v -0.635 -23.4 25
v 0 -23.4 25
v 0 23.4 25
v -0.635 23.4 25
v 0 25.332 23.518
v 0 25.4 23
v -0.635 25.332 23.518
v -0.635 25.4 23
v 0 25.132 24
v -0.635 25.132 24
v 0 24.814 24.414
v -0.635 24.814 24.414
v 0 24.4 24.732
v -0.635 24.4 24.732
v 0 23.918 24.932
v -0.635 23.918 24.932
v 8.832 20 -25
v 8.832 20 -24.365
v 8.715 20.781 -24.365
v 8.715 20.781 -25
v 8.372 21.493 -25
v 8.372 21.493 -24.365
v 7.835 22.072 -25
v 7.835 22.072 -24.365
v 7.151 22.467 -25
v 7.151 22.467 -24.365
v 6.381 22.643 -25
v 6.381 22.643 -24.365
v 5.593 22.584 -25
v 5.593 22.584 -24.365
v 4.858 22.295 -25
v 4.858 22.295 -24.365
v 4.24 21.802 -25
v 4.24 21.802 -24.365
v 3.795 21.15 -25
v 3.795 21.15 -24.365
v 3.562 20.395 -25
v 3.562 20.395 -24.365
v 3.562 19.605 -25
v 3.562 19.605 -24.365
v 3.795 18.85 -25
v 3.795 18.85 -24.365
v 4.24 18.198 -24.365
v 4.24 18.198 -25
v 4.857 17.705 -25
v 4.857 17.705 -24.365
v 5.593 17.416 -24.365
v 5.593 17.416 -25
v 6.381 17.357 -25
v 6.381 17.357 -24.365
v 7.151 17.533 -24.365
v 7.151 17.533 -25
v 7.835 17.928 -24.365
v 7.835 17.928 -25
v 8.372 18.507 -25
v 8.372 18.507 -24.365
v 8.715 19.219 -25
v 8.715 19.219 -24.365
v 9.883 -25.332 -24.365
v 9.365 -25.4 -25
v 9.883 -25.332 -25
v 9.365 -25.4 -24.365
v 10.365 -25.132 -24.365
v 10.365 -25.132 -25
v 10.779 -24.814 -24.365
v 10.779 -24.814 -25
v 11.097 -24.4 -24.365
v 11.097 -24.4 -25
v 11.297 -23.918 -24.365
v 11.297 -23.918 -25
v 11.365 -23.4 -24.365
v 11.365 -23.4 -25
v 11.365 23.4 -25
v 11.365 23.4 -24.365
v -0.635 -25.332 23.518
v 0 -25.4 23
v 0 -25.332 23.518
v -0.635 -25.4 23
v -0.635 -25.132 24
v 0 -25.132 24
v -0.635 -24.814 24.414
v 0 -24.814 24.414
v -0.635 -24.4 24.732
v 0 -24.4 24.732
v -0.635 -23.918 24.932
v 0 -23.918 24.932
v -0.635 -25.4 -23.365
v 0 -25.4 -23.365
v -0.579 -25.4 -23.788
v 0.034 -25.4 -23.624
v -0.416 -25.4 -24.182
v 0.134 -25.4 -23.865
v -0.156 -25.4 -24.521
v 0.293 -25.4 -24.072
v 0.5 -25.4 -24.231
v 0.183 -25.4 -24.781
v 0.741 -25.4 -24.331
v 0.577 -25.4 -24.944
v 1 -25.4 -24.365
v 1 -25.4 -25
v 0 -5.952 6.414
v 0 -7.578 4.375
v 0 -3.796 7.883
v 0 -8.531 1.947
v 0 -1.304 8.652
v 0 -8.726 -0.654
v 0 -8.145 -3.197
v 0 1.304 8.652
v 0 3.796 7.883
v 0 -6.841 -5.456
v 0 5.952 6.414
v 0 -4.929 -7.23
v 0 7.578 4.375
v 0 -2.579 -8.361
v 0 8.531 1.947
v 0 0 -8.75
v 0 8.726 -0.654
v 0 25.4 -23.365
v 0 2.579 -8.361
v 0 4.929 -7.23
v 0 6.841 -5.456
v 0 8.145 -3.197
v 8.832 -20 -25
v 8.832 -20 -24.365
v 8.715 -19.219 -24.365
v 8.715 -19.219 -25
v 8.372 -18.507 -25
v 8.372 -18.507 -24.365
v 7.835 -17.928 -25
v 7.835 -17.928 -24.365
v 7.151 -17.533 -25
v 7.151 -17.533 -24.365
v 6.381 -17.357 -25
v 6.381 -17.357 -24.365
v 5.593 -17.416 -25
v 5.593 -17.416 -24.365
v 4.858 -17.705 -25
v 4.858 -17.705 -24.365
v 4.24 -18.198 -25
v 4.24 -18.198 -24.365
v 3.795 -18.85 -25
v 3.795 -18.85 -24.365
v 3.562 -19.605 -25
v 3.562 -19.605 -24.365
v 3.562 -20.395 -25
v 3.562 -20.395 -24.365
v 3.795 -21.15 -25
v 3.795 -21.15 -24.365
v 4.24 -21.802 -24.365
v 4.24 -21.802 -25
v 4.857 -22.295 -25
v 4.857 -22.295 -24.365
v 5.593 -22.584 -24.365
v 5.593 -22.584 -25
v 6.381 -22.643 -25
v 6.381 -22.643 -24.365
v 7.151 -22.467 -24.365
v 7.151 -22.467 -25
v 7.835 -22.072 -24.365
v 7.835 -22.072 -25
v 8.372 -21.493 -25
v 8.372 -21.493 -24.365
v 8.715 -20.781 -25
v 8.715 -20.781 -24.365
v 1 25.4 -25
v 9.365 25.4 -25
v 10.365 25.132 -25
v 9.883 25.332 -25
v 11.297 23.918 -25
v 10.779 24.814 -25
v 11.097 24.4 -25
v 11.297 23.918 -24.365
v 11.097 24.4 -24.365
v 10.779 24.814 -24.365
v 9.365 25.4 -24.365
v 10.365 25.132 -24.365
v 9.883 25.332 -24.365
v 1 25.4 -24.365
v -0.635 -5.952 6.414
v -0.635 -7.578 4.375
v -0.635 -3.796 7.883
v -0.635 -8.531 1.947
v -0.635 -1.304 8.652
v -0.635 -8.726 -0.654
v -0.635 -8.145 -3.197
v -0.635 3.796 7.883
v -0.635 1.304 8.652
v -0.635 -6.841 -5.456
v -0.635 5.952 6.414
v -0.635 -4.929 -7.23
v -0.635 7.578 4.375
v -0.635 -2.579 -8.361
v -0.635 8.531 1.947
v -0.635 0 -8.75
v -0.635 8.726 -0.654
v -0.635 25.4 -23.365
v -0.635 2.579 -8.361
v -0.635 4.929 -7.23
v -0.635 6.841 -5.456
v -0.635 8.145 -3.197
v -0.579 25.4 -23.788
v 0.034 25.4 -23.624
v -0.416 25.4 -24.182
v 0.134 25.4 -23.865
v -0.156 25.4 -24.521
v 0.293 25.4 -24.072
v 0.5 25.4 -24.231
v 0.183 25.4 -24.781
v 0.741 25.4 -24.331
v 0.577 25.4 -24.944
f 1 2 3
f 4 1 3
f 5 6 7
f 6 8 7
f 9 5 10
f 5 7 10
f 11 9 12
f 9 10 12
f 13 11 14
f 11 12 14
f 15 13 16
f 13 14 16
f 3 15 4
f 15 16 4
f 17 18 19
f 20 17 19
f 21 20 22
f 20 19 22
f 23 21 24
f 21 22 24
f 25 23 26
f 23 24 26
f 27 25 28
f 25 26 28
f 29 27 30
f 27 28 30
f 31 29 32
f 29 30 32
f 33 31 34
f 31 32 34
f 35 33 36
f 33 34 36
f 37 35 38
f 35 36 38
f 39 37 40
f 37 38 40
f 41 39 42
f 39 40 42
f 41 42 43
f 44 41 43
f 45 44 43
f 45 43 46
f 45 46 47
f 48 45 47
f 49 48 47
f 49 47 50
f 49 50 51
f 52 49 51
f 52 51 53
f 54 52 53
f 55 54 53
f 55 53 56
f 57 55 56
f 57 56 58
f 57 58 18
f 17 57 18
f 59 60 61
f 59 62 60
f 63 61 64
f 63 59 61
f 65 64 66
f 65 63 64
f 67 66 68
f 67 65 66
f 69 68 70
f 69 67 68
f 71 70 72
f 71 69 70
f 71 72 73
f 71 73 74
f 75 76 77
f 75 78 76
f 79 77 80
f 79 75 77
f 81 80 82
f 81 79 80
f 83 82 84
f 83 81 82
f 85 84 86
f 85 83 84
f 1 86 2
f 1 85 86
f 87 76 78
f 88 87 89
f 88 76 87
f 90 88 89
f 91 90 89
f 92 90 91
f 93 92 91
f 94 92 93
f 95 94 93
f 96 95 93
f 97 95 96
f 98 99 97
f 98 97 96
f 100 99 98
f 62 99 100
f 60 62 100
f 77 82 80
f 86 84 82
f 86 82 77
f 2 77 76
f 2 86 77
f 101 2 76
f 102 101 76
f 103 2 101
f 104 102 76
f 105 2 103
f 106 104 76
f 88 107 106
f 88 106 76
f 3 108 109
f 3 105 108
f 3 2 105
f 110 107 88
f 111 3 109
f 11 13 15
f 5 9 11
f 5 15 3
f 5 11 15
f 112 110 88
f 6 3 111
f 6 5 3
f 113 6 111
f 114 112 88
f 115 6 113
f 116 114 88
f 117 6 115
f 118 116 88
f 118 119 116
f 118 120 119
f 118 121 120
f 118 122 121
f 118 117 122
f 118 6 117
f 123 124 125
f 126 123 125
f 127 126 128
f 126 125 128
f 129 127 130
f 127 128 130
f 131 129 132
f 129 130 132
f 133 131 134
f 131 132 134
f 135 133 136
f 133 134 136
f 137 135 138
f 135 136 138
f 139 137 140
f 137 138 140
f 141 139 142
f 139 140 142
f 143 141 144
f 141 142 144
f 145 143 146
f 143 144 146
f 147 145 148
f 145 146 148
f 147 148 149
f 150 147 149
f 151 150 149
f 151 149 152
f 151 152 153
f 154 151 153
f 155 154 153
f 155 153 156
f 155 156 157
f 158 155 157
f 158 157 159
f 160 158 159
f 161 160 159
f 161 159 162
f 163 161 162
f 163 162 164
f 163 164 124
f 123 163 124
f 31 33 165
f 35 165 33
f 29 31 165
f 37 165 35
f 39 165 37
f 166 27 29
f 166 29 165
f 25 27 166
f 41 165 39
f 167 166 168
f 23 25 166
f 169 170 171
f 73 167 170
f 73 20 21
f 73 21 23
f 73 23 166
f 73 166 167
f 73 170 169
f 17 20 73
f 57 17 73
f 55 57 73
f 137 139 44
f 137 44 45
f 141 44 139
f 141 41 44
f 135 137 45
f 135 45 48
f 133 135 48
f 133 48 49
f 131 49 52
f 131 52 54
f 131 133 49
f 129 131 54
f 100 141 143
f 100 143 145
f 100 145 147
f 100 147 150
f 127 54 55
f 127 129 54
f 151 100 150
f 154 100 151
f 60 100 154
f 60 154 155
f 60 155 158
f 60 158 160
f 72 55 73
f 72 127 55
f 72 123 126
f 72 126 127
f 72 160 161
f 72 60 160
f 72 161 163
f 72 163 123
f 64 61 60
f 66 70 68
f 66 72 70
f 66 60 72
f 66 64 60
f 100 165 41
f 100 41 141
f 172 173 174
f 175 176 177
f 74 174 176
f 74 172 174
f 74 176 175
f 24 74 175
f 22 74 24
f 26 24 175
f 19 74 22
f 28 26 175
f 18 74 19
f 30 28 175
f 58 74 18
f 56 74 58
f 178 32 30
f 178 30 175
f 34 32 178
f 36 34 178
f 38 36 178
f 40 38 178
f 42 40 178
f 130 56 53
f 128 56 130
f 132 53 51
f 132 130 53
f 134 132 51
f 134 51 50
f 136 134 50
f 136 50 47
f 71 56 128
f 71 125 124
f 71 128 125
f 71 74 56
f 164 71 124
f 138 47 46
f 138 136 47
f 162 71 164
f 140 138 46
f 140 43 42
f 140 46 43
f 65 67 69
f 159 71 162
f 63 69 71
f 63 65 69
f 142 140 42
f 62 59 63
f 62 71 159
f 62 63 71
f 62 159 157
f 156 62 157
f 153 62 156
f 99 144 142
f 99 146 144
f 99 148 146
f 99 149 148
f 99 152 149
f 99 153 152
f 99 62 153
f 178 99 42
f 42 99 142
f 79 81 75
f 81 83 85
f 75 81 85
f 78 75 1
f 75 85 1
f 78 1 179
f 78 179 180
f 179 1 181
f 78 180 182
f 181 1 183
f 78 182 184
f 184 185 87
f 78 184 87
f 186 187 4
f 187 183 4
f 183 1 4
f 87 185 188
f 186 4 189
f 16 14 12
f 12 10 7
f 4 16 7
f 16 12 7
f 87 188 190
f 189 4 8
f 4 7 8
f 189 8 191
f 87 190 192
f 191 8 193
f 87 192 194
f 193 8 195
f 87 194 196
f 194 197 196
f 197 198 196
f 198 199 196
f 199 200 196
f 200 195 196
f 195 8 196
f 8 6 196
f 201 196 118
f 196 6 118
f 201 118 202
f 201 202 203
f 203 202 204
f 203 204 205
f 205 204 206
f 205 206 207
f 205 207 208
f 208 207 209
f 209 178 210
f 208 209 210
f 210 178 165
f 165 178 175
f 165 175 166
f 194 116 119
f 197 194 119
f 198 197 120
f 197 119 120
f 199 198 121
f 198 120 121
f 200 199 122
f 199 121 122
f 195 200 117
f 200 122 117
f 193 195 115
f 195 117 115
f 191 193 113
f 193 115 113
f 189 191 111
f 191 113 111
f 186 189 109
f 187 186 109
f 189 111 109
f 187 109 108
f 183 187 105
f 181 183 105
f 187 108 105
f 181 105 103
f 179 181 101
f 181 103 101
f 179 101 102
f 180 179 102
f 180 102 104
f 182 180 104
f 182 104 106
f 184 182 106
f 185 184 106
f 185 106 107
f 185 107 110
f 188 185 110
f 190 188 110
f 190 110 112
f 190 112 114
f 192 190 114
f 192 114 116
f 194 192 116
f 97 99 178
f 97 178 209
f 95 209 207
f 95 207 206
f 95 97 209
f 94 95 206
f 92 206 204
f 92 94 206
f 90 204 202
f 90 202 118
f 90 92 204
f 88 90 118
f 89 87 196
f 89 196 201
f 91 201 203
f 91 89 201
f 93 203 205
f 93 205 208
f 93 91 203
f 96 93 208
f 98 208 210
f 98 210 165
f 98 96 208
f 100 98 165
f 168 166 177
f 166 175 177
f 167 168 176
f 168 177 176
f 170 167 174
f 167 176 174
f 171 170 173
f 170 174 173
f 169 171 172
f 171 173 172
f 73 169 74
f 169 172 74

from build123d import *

# Parameters (mm, degrees)
SKETCH1_W                    = 50
SKETCH1_H                    = 50.8
BASE_FLANGE1_DEPTH           = 0.635
SKETCH9_R                    = 8.75
CUT_EXTRUDE1_DEPTH           = 36.644960724
EDGE_FLANGE1_STRIP_W         = 4.54
EDGE_FLANGE1_STRIP_H         = 0.635
EDGE_FLANGE1_STRIP_CUT_DEPTH = 50.8
EDGE_FLANGE1_DEPTH           = 50.8
SKETCH13_R                   = 2.65
CUT_EXTRUDE2_DEPTH           = 57.667684354
FILLET1_R                    = 2


# Sheet-metal steps are written as plain solids
with BuildPart() as part:
    # Sketch1 → Base-Flange1 (new body)
    with BuildSketch(Plane(origin=(0, 0, 0), x_dir=(0, 0, -1), z_dir=(1, 0, 0))):
        Rectangle(SKETCH1_W, SKETCH1_H)
    extrude(amount=-BASE_FLANGE1_DEPTH)

    # Sketch9 → Cut-Extrude1 (cut, through all)
    with BuildSketch(Plane(origin=(0, 0, 0), x_dir=(0, 0, -1), z_dir=(1, 0, 0))):
        Circle(SKETCH9_R)
    extrude(amount=-CUT_EXTRUDE1_DEPTH, mode=Mode.SUBTRACT)

    # Edge-Flange1 strip (across the edge) → Edge-Flange1 strip cut (cut)
    with BuildSketch(Plane(origin=(0, -25.4, -25), x_dir=(0, 0, 1), z_dir=(0, 1, 0))):
        with Locations((-0.635, -0.3175)):
            Rectangle(EDGE_FLANGE1_STRIP_W, EDGE_FLANGE1_STRIP_H)
    extrude(amount=EDGE_FLANGE1_STRIP_CUT_DEPTH, mode=Mode.SUBTRACT)

    # Edge-Flange1 section (across the edge) → Edge-Flange1 (add)
    with BuildSketch(Plane(origin=(0, -25.4, -25), x_dir=(0, 0, 1), z_dir=(0, 1, 0))):
        with BuildLine():
            Line((0, 1), (0, 11.365))
            Line((0, 11.365), (0.635, 11.365))
            Line((0.635, 11.365), (0.635, 1))
            ThreePointArc((0.635, 1), (0.927893219, 0.292893219), (1.635, 0))
            Line((1.635, 0), (1.635, -0.635))
            ThreePointArc((1.635, -0.635), (0.478880413, -0.156119587), (0, 1))
        make_face()
    extrude(amount=EDGE_FLANGE1_DEPTH)

    # Sketch13 → Cut-Extrude2 (cut, through all)
    with BuildSketch(Plane.XY.offset(-24.365)):
        with Locations((6.1825, -20)):
            Circle(SKETCH13_R)
        with Locations((6.1825, 20)):
            Circle(SKETCH13_R)
    extrude(amount=-CUT_EXTRUDE2_DEPTH, mode=Mode.SUBTRACT)

    # Fillet1
    fillet1_edges = [part.edges().sort_by_distance(p)[0] for p in [
        (11.365, -25.4, -24.6825),
        (11.365, 25.4, -24.6825),
        (-0.3175, -25.4, 25),
        (-0.3175, 25.4, 25),
    ]]
    fillet(fillet1_edges, radius=FILLET1_R)


solid = part.part
